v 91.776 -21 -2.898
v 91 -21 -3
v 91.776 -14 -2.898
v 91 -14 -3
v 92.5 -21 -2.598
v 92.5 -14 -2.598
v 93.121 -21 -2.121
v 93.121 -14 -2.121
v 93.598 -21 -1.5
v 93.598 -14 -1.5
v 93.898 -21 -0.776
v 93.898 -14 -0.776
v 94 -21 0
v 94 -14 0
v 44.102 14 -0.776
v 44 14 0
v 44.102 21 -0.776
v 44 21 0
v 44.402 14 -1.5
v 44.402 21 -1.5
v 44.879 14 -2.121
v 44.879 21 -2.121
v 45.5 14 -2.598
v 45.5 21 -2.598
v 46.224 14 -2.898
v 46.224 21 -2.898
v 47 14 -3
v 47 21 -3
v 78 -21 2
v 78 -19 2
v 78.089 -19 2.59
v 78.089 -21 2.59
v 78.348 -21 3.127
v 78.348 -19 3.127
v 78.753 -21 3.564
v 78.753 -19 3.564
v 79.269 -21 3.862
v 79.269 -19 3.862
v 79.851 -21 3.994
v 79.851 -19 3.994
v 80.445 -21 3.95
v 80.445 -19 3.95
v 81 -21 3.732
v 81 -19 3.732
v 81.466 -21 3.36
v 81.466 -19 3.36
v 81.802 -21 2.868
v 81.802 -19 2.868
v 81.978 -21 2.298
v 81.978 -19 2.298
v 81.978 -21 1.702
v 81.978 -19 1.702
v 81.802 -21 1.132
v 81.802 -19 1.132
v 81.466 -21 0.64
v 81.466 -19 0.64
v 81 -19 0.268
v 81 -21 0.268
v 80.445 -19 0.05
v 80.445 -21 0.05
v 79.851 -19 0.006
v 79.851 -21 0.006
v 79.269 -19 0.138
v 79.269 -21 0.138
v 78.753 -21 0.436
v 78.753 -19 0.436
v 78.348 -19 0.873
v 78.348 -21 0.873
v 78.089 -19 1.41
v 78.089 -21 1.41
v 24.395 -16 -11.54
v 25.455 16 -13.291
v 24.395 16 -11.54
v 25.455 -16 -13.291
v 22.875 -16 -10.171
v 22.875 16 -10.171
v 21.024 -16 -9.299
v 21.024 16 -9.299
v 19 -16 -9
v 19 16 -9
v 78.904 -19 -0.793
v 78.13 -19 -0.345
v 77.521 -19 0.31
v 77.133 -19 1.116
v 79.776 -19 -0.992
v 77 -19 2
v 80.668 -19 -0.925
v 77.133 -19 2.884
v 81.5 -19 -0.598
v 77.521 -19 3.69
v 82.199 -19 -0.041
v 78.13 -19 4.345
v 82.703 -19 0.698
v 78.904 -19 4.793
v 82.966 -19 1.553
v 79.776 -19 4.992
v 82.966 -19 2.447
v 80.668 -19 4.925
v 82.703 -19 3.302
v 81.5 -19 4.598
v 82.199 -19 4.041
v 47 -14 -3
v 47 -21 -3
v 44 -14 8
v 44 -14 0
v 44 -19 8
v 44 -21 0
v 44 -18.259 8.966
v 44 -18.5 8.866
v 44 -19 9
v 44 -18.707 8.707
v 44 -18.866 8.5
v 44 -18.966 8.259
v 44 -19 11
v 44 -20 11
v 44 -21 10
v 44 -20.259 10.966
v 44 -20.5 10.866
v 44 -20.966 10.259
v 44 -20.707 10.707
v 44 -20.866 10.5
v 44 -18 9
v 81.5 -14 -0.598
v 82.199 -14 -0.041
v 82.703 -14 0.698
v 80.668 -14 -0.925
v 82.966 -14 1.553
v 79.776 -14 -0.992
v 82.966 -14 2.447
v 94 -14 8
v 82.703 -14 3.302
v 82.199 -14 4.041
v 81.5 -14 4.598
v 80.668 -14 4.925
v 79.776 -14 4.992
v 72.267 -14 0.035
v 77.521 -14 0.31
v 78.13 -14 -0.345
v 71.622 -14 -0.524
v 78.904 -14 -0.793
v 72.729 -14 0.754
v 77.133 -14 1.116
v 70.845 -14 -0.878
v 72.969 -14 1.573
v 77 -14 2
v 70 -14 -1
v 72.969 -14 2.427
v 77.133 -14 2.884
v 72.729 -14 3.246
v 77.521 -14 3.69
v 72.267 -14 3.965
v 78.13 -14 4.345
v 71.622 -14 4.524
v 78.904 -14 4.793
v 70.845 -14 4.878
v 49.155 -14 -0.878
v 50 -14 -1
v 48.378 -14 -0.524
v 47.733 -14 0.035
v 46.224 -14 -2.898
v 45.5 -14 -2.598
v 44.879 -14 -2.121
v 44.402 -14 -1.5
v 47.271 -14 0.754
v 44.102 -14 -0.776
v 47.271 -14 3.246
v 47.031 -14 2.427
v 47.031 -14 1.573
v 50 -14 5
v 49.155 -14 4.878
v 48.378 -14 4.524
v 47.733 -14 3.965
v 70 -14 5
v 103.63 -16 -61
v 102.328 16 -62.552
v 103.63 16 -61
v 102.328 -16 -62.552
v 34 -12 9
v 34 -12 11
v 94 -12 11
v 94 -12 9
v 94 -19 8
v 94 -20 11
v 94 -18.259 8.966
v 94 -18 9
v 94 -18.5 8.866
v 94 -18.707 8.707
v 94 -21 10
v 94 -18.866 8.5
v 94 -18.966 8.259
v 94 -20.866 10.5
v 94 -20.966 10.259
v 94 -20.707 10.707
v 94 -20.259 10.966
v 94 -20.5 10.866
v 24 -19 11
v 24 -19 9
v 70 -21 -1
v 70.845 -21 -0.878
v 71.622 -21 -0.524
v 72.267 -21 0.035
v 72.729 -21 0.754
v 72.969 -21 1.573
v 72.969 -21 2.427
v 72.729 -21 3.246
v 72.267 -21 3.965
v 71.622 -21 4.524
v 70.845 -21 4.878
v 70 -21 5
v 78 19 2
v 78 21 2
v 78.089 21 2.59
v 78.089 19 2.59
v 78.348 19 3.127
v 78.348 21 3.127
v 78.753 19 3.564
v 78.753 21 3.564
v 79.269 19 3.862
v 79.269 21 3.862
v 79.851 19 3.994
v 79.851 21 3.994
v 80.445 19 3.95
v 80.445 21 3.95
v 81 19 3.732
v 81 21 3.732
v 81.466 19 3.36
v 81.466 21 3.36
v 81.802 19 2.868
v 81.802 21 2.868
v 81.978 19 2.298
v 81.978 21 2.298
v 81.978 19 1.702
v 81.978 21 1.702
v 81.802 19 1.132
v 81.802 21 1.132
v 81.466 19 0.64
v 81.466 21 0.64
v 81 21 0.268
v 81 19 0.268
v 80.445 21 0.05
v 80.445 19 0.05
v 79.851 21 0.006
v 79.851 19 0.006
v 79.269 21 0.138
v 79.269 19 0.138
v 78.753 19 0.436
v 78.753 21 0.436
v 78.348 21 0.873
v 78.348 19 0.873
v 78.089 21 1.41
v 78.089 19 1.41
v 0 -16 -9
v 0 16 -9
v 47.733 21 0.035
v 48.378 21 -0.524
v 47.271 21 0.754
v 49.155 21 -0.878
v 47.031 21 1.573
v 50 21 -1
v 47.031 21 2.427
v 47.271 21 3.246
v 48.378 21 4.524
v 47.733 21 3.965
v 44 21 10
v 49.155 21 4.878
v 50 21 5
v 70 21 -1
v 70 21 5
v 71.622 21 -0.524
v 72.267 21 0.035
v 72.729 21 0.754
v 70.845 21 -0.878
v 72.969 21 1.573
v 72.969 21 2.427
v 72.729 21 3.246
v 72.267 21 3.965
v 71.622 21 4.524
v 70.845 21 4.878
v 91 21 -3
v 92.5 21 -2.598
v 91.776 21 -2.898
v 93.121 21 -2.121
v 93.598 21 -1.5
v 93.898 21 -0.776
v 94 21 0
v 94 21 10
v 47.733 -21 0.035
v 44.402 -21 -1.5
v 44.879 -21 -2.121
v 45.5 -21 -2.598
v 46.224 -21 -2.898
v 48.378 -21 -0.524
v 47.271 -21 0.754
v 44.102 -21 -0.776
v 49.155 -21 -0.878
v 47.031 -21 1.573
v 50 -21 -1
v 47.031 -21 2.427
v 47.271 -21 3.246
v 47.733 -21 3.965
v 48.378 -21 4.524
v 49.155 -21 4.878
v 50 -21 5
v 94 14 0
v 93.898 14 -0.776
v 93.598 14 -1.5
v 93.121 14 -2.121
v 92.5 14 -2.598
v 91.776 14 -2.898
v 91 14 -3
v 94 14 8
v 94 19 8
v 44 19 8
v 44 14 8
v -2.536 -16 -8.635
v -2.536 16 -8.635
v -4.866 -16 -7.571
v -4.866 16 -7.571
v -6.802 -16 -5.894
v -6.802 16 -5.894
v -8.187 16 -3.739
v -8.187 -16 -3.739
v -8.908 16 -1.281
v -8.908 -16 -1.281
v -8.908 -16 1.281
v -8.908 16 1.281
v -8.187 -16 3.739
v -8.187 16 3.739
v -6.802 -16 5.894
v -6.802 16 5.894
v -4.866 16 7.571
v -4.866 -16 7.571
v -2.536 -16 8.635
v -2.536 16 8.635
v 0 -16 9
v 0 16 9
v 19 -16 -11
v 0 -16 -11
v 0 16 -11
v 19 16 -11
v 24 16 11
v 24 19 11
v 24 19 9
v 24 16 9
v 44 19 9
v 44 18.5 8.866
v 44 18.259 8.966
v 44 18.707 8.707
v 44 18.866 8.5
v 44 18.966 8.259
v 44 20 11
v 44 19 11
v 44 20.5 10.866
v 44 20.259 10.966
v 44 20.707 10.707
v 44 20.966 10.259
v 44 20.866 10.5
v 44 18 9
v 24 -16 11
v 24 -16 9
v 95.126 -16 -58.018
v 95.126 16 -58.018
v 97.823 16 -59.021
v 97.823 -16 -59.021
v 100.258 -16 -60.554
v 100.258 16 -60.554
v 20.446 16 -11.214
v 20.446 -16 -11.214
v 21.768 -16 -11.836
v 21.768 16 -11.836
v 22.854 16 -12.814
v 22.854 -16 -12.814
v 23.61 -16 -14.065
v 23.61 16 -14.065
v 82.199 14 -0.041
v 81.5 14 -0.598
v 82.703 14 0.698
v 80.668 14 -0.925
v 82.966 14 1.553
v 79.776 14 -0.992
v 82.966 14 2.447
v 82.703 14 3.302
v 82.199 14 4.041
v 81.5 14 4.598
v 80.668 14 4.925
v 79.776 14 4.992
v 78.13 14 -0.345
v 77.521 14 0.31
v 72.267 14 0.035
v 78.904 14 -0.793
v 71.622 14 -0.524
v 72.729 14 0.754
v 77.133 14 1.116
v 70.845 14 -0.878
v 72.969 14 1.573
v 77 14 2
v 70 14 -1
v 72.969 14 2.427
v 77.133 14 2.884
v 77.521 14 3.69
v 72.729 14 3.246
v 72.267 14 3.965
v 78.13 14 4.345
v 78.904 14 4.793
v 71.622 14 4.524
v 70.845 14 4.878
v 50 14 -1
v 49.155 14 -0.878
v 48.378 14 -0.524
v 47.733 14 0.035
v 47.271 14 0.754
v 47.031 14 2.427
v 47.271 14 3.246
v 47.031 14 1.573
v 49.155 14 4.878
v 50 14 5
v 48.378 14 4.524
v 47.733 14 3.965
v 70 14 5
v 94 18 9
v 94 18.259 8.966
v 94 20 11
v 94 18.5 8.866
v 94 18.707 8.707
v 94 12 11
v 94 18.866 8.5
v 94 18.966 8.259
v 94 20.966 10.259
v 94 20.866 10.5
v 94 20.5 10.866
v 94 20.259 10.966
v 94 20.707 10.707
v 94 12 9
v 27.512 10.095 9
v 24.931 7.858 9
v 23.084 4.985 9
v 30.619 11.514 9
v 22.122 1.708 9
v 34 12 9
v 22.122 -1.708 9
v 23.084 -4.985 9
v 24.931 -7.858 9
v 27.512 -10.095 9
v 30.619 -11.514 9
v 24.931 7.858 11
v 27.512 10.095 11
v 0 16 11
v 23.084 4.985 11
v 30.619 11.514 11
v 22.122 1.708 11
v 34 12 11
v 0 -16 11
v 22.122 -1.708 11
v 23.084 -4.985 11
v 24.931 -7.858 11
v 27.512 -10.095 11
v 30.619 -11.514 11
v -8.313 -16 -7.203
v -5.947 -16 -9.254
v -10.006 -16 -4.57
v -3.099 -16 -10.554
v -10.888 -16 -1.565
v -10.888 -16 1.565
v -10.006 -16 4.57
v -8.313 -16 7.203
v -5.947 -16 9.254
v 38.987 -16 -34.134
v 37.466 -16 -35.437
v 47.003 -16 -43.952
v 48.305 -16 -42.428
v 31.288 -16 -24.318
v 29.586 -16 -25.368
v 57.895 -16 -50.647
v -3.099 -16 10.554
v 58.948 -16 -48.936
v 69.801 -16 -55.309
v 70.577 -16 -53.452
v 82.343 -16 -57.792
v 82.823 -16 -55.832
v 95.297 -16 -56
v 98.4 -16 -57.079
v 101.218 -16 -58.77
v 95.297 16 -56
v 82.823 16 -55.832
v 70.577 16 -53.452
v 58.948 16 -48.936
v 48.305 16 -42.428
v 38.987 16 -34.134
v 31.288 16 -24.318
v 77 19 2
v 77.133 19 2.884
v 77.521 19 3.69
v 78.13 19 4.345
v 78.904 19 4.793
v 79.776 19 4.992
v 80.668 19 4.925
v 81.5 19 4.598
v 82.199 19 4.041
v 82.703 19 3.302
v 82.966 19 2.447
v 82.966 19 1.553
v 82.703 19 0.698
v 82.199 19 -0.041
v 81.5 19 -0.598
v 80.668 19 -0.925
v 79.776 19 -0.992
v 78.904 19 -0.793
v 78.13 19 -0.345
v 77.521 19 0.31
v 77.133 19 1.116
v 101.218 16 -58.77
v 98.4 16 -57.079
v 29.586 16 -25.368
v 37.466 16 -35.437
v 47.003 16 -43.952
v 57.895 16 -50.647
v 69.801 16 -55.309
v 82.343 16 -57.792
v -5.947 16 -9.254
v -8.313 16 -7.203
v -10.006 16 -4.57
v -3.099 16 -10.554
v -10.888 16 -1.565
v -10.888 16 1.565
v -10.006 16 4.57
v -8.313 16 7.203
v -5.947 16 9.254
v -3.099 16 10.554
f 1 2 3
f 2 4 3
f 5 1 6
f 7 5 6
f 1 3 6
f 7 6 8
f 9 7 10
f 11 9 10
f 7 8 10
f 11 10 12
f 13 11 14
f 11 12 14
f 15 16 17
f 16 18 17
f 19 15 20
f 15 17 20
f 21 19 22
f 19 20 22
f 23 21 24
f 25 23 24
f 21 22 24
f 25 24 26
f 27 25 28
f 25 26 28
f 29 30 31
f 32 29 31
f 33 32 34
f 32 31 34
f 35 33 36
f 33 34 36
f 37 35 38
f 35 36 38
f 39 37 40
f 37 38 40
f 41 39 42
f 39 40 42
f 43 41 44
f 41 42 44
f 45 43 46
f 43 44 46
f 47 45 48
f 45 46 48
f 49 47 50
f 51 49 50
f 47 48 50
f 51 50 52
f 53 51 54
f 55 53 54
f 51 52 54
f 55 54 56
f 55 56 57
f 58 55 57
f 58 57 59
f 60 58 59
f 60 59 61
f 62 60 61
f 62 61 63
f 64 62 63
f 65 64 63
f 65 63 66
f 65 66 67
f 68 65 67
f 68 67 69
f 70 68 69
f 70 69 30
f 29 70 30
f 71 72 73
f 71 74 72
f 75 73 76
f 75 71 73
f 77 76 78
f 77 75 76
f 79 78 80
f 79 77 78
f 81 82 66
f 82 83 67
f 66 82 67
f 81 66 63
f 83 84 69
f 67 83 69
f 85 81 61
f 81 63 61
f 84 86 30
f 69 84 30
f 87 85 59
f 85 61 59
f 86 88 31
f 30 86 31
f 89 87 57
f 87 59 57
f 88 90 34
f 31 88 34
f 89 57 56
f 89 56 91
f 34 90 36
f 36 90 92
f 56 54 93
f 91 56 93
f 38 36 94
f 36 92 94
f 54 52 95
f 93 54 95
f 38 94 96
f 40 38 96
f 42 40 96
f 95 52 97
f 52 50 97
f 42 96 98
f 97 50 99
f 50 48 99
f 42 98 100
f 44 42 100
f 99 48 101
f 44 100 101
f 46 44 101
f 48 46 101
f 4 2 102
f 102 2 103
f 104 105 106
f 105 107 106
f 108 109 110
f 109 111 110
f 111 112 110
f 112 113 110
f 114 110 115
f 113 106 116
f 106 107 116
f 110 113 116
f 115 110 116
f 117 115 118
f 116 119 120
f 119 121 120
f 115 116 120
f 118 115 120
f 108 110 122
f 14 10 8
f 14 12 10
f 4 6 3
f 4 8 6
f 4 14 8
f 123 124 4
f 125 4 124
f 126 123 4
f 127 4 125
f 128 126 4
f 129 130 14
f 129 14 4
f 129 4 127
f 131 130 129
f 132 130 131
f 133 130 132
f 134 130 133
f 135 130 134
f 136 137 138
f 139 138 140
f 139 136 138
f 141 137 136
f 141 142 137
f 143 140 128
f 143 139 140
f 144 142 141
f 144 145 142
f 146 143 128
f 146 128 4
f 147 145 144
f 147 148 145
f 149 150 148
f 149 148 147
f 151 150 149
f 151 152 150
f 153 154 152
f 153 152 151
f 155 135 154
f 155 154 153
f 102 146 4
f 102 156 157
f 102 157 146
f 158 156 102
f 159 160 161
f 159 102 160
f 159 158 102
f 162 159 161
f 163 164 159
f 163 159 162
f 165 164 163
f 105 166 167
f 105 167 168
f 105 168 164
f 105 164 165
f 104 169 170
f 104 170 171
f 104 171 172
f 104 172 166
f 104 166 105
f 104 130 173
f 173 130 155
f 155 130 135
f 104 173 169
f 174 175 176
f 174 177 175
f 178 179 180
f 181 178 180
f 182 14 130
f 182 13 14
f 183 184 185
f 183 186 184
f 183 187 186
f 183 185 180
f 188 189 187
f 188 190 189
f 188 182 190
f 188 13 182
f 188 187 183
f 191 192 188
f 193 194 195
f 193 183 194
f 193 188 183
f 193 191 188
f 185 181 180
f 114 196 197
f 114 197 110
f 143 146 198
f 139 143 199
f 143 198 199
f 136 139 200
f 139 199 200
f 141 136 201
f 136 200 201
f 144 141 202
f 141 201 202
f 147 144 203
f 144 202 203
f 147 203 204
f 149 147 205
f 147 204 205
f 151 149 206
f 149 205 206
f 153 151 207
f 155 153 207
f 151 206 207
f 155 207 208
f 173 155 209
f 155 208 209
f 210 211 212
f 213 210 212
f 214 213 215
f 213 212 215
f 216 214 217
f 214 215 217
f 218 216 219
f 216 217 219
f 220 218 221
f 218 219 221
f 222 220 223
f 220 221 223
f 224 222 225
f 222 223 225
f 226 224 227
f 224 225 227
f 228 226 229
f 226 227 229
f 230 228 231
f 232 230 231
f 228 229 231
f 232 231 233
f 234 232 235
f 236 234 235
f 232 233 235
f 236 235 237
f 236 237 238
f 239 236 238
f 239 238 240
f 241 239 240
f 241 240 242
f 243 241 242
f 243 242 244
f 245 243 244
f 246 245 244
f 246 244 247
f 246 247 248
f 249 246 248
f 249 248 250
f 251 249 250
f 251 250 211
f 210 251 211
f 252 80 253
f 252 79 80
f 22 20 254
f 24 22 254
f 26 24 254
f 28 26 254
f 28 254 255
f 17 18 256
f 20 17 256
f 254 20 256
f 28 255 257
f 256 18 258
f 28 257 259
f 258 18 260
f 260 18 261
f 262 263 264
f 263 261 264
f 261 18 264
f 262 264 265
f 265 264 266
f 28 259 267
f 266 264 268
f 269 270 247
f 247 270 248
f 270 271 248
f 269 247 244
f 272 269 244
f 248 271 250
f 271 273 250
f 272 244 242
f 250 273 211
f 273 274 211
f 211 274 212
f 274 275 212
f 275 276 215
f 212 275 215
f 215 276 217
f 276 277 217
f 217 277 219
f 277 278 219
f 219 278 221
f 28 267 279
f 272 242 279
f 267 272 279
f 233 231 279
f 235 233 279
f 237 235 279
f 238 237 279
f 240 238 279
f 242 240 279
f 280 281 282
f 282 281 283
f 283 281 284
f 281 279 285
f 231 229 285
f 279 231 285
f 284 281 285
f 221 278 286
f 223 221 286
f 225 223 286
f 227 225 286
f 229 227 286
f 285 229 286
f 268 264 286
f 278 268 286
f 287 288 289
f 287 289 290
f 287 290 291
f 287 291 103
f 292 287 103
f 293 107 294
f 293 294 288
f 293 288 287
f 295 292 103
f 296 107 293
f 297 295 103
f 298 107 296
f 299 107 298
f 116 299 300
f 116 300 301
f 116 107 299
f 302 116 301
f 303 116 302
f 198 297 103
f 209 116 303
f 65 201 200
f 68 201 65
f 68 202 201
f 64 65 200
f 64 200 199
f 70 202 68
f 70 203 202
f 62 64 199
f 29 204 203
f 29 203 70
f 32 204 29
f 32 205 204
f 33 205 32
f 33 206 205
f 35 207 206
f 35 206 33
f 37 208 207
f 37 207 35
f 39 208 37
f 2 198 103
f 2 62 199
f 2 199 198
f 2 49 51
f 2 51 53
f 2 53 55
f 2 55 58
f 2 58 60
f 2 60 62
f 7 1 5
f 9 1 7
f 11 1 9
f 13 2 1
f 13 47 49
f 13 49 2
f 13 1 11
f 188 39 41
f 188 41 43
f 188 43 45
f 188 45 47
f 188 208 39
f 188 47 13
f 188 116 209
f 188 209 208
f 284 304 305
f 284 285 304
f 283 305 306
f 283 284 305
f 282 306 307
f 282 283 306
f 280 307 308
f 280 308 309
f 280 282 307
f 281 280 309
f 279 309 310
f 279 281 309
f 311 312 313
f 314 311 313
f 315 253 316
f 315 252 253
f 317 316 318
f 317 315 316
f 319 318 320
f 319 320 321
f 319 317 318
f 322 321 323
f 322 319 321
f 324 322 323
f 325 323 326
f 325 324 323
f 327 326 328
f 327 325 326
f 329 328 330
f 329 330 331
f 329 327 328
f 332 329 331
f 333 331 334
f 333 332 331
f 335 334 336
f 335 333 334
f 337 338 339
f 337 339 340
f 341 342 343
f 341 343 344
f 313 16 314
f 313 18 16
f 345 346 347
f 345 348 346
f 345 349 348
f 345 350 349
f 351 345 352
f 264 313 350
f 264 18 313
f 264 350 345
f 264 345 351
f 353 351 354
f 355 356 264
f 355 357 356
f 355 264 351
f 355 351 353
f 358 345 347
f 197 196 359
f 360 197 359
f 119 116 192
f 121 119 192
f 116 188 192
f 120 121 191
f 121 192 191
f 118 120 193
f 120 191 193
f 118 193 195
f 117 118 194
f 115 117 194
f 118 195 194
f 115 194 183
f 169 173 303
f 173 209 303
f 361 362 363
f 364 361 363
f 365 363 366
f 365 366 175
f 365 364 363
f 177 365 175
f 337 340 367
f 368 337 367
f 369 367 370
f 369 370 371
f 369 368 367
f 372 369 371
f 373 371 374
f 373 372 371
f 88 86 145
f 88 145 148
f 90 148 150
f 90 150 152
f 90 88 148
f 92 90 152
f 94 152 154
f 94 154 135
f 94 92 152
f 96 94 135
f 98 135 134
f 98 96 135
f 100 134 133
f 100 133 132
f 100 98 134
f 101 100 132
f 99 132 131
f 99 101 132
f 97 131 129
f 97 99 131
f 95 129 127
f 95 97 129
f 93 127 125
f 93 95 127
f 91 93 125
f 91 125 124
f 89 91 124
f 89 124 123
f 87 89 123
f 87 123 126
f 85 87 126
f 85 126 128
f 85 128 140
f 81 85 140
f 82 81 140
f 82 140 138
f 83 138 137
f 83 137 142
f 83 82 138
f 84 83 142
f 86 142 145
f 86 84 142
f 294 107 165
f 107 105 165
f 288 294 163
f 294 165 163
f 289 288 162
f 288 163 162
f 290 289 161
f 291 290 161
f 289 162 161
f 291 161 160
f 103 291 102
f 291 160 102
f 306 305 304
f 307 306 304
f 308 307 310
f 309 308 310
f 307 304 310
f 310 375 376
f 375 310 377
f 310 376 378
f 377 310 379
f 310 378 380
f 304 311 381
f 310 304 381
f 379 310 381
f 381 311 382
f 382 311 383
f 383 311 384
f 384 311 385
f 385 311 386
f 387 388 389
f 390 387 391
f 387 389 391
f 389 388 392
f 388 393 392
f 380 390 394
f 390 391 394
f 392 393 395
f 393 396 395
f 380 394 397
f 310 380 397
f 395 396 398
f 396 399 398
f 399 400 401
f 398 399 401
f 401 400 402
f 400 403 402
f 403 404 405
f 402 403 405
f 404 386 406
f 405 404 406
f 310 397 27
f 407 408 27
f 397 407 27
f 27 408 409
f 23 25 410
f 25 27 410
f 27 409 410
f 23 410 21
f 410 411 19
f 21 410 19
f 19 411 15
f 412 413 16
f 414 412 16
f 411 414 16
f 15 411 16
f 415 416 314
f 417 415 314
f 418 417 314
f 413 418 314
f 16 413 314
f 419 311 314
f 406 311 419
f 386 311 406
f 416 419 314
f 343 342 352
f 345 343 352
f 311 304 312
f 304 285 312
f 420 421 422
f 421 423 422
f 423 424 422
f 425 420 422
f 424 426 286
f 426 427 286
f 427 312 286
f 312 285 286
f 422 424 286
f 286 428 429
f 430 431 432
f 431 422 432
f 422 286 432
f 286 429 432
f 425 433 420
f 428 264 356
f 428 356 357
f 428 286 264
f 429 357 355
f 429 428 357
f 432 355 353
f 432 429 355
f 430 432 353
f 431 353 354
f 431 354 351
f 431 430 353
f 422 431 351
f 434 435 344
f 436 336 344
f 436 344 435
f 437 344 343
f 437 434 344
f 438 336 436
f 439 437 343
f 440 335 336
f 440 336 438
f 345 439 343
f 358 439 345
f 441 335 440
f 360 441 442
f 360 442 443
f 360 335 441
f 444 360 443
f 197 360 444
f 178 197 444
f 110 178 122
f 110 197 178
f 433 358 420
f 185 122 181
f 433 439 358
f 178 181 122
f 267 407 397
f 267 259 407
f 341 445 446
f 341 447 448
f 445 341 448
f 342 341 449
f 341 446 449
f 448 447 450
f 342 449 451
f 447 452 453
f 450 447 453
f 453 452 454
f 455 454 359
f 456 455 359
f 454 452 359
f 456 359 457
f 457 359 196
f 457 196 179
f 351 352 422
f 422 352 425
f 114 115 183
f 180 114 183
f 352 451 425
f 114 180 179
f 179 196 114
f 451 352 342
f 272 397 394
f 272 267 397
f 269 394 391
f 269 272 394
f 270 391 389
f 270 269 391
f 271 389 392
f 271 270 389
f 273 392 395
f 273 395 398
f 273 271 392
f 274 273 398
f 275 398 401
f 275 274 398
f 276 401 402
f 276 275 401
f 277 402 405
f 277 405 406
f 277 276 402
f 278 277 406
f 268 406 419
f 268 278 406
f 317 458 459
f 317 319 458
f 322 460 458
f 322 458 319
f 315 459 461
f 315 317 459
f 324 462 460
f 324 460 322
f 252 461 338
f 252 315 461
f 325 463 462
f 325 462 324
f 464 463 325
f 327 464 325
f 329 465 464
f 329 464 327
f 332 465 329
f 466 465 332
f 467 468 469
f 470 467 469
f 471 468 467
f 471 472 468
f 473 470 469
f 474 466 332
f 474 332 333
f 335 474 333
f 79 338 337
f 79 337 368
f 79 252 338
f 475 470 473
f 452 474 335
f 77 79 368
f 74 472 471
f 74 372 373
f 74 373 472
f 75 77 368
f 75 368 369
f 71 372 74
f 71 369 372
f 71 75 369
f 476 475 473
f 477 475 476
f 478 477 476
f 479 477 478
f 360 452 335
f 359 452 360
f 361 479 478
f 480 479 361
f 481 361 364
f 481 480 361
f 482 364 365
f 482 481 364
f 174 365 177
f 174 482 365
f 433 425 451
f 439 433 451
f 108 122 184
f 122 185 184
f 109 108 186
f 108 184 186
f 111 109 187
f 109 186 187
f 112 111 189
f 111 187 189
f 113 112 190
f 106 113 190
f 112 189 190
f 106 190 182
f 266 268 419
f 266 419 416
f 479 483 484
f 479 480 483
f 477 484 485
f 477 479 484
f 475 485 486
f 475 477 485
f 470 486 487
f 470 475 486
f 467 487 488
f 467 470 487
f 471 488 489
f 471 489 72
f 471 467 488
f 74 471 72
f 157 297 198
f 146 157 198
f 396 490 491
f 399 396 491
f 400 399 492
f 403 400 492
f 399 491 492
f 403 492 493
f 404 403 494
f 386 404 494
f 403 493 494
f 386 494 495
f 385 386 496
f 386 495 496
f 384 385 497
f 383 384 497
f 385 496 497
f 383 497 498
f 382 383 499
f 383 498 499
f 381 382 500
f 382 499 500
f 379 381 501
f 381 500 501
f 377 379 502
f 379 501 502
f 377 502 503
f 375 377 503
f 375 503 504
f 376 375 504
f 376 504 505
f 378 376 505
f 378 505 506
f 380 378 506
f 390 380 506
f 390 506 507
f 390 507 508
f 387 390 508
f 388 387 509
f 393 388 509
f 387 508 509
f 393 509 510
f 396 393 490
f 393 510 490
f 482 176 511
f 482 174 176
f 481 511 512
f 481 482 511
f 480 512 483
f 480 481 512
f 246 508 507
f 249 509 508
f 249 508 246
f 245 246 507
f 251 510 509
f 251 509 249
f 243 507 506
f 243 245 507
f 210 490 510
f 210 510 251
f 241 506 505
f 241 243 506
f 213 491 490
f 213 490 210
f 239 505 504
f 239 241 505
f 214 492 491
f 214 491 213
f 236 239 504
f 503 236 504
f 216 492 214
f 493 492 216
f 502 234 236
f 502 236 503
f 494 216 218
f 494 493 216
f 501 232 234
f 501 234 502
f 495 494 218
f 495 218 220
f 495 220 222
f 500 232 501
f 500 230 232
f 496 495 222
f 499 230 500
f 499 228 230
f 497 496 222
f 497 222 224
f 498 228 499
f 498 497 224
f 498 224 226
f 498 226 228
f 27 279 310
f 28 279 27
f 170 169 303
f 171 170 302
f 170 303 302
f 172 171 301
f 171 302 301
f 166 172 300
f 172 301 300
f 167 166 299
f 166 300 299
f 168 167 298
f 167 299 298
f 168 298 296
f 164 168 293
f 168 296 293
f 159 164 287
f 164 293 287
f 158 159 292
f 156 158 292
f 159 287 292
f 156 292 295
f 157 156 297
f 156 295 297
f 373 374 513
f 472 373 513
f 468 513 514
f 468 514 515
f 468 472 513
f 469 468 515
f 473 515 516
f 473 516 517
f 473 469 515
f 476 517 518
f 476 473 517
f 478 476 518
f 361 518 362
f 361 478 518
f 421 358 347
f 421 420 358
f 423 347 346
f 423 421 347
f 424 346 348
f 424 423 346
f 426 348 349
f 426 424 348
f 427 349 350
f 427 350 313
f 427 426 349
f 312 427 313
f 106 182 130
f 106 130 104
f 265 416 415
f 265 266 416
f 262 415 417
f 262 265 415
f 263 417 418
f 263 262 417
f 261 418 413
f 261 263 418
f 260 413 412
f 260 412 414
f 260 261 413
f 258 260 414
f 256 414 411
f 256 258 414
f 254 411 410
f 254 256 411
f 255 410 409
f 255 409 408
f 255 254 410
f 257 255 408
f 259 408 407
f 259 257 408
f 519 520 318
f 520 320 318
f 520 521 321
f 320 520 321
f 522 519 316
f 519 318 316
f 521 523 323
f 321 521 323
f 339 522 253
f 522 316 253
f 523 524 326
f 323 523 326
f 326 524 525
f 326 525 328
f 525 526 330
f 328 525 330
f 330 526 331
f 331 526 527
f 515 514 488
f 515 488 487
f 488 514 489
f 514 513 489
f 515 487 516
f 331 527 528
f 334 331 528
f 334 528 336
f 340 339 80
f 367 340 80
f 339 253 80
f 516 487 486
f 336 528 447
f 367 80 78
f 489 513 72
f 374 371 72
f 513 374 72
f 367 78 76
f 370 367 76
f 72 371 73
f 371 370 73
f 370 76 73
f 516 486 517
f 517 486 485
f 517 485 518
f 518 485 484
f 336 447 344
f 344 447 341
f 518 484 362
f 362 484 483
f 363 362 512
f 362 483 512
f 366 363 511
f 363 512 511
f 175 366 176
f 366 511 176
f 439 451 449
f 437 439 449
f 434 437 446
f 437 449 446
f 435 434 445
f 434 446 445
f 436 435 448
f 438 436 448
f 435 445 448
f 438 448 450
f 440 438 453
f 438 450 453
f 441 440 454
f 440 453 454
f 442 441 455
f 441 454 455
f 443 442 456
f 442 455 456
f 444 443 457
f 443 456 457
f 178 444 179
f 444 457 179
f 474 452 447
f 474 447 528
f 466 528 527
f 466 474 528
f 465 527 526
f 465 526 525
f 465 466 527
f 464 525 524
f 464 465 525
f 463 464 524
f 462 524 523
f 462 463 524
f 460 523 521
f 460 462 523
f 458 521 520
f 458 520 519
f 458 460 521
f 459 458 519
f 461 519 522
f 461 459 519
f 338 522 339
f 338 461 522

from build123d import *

# Parameters (mm, degrees)
F1_DEPTH       = 16
F2_W           = 70
F2_H           = 3
F3_DEPTH       = 2
F4_W           = 50
F4_H           = 14
F5_DEPTH       = 2
F6_R           = 1
F9_DEPTH       = 2
F11_DEPTH      = 21.001
F11_DEPTH_BACK = 25
F13_D          = 4
F14_W          = 50
F14_H          = 11
F14_R          = 3
F15_DEPTH      = 5
F16_R          = 3


# Not quite as in the source:
# - a pattern or mirror of a feature is missing from the dataset's text; its kind, count and spacing are read off the source's solid


with BuildPart() as f1:
    # F0 (on Front) → F1 (new body)
    with BuildSketch(Plane.XZ):
        with BuildLine():
            ThreePointArc((0, -9), (-9, 0), (0, 9))
            Line((0, 9), (94, 9))
            Line((94, 9), (94, 11))
            Line((94, 11), (0, 11))
            ThreePointArc((0, 11), (-11, 0), (0, -11))
            Line((0, -11), (19, -11))
            ThreePointArc((19, -11), (21.7681124643, -11.8361612201), (23.6103896104, -14.064978646))
            ThreePointArc((23.6103896104, -14.064978646), (52.3002338891, -47.5417473959), (95.1260447976, -58.0179647813))
            ThreePointArc((95.1260447976, -58.0179647813), (99.0798371754, -59.7246197028), (102.3278575446, -62.552252789))
            Line((102.3278575446, -62.552252789), (103.6303522873, -61))
            ThreePointArc((103.6303522873, -61), (99.852279938, -57.8519370421), (95.2965735981, -56))
            ThreePointArc((95.2965735981, -56), (53.4811996085, -45.9198240056), (25.4545454545, -13.2909701044))
            ThreePointArc((25.4545454545, -13.2909701044), (22.87535745, -10.1706257081), (19, -9))
            Line((19, -9), (0, -9))
        make_face()
    extrude(amount=F1_DEPTH)

    # F2 (on face) → F3 (join)
    with BuildSketch(Plane.XY.offset(11)):
        with Locations((59, -17.5)):
            Rectangle(F2_W, F2_H)
    extrude(amount=-F3_DEPTH)

    # F4 (on face) → F5 (join)
    with BuildSketch(Plane.XZ.offset(19)):
        with Locations((69, 4)):
            Rectangle(F4_W, F4_H)
    extrude(amount=F5_DEPTH)

    # F6
    f6_edges = [f1.edges().sort_by_distance(p)[0] for p in [
        (69, -21, 11),
        (69, -19, 9),
    ]]
    fillet(f6_edges, radius=F6_R)

    # F7: F1 across plane


with BuildPart() as f1_1:
    add(f1.part)
    add(f1.part.mirror(Plane.XZ))

    # F8 (on face) → F9 (cut)
    with BuildSketch(Plane.XY.offset(11)):
        with BuildLine():
            Line((94, 12), (34, 12))
            ThreePointArc((34, 12), (22, 0), (34, -12))
            Line((34, -12), (94, -12))
            Line((94, -12), (94, 12))
        make_face()
    extrude(amount=-F9_DEPTH, mode=Mode.SUBTRACT)

    # F10 (on Front) → F11 (cut, two sides)
    with BuildSketch(Plane.XZ) as f11_sk:
        with BuildLine():
            ThreePointArc((50, 5), (47, 2), (50, -1))
            Line((50, -1), (70, -1))
            ThreePointArc((70, -1), (73, 2), (70, 5))
            Line((70, 5), (50, 5))
        make_face()
    extrude(amount=-F11_DEPTH, mode=Mode.SUBTRACT)
    extrude(f11_sk.sketch, amount=F11_DEPTH_BACK, mode=Mode.SUBTRACT)

    # F13 (through all)
    with Locations(Plane.XZ.offset(21)):
        with Locations((80, 2)):
            Hole(F13_D / 2)

    # F14 (on face) → F15 (join)
    with BuildSketch(Plane(origin=(0, -19, 0), x_dir=(-1, 0, 0), z_dir=(0, 1, 0))):
        with Locations((-69, 2.5)):
            Rectangle(F14_W, F14_H)
        with Locations((-80, 2)):
            Circle(F14_R, mode=Mode.SUBTRACT)
        with BuildLine():
            Line((-70, 5), (-50, 5))
            ThreePointArc((-50, 5), (-47, 2), (-50, -1))
            Line((-50, -1), (-70, -1))
            ThreePointArc((-70, -1), (-73, 2), (-70, 5))
        make_face(mode=Mode.SUBTRACT)
    f15 = extrude(amount=F15_DEPTH)

    # F15_copies: F15 across plane
    add(f15.mirror(Plane.ZX))

    # F16
    f16_edges = [f1_1.edges().sort_by_distance(p)[0] for p in [
        (44, -17.5, -3),
        (94, -17.5, -3),
        (44, 17.5, -3),
        (94, 17.5, -3),
    ]]
    fillet(f16_edges, radius=F16_R)


solid = f1_1.part
